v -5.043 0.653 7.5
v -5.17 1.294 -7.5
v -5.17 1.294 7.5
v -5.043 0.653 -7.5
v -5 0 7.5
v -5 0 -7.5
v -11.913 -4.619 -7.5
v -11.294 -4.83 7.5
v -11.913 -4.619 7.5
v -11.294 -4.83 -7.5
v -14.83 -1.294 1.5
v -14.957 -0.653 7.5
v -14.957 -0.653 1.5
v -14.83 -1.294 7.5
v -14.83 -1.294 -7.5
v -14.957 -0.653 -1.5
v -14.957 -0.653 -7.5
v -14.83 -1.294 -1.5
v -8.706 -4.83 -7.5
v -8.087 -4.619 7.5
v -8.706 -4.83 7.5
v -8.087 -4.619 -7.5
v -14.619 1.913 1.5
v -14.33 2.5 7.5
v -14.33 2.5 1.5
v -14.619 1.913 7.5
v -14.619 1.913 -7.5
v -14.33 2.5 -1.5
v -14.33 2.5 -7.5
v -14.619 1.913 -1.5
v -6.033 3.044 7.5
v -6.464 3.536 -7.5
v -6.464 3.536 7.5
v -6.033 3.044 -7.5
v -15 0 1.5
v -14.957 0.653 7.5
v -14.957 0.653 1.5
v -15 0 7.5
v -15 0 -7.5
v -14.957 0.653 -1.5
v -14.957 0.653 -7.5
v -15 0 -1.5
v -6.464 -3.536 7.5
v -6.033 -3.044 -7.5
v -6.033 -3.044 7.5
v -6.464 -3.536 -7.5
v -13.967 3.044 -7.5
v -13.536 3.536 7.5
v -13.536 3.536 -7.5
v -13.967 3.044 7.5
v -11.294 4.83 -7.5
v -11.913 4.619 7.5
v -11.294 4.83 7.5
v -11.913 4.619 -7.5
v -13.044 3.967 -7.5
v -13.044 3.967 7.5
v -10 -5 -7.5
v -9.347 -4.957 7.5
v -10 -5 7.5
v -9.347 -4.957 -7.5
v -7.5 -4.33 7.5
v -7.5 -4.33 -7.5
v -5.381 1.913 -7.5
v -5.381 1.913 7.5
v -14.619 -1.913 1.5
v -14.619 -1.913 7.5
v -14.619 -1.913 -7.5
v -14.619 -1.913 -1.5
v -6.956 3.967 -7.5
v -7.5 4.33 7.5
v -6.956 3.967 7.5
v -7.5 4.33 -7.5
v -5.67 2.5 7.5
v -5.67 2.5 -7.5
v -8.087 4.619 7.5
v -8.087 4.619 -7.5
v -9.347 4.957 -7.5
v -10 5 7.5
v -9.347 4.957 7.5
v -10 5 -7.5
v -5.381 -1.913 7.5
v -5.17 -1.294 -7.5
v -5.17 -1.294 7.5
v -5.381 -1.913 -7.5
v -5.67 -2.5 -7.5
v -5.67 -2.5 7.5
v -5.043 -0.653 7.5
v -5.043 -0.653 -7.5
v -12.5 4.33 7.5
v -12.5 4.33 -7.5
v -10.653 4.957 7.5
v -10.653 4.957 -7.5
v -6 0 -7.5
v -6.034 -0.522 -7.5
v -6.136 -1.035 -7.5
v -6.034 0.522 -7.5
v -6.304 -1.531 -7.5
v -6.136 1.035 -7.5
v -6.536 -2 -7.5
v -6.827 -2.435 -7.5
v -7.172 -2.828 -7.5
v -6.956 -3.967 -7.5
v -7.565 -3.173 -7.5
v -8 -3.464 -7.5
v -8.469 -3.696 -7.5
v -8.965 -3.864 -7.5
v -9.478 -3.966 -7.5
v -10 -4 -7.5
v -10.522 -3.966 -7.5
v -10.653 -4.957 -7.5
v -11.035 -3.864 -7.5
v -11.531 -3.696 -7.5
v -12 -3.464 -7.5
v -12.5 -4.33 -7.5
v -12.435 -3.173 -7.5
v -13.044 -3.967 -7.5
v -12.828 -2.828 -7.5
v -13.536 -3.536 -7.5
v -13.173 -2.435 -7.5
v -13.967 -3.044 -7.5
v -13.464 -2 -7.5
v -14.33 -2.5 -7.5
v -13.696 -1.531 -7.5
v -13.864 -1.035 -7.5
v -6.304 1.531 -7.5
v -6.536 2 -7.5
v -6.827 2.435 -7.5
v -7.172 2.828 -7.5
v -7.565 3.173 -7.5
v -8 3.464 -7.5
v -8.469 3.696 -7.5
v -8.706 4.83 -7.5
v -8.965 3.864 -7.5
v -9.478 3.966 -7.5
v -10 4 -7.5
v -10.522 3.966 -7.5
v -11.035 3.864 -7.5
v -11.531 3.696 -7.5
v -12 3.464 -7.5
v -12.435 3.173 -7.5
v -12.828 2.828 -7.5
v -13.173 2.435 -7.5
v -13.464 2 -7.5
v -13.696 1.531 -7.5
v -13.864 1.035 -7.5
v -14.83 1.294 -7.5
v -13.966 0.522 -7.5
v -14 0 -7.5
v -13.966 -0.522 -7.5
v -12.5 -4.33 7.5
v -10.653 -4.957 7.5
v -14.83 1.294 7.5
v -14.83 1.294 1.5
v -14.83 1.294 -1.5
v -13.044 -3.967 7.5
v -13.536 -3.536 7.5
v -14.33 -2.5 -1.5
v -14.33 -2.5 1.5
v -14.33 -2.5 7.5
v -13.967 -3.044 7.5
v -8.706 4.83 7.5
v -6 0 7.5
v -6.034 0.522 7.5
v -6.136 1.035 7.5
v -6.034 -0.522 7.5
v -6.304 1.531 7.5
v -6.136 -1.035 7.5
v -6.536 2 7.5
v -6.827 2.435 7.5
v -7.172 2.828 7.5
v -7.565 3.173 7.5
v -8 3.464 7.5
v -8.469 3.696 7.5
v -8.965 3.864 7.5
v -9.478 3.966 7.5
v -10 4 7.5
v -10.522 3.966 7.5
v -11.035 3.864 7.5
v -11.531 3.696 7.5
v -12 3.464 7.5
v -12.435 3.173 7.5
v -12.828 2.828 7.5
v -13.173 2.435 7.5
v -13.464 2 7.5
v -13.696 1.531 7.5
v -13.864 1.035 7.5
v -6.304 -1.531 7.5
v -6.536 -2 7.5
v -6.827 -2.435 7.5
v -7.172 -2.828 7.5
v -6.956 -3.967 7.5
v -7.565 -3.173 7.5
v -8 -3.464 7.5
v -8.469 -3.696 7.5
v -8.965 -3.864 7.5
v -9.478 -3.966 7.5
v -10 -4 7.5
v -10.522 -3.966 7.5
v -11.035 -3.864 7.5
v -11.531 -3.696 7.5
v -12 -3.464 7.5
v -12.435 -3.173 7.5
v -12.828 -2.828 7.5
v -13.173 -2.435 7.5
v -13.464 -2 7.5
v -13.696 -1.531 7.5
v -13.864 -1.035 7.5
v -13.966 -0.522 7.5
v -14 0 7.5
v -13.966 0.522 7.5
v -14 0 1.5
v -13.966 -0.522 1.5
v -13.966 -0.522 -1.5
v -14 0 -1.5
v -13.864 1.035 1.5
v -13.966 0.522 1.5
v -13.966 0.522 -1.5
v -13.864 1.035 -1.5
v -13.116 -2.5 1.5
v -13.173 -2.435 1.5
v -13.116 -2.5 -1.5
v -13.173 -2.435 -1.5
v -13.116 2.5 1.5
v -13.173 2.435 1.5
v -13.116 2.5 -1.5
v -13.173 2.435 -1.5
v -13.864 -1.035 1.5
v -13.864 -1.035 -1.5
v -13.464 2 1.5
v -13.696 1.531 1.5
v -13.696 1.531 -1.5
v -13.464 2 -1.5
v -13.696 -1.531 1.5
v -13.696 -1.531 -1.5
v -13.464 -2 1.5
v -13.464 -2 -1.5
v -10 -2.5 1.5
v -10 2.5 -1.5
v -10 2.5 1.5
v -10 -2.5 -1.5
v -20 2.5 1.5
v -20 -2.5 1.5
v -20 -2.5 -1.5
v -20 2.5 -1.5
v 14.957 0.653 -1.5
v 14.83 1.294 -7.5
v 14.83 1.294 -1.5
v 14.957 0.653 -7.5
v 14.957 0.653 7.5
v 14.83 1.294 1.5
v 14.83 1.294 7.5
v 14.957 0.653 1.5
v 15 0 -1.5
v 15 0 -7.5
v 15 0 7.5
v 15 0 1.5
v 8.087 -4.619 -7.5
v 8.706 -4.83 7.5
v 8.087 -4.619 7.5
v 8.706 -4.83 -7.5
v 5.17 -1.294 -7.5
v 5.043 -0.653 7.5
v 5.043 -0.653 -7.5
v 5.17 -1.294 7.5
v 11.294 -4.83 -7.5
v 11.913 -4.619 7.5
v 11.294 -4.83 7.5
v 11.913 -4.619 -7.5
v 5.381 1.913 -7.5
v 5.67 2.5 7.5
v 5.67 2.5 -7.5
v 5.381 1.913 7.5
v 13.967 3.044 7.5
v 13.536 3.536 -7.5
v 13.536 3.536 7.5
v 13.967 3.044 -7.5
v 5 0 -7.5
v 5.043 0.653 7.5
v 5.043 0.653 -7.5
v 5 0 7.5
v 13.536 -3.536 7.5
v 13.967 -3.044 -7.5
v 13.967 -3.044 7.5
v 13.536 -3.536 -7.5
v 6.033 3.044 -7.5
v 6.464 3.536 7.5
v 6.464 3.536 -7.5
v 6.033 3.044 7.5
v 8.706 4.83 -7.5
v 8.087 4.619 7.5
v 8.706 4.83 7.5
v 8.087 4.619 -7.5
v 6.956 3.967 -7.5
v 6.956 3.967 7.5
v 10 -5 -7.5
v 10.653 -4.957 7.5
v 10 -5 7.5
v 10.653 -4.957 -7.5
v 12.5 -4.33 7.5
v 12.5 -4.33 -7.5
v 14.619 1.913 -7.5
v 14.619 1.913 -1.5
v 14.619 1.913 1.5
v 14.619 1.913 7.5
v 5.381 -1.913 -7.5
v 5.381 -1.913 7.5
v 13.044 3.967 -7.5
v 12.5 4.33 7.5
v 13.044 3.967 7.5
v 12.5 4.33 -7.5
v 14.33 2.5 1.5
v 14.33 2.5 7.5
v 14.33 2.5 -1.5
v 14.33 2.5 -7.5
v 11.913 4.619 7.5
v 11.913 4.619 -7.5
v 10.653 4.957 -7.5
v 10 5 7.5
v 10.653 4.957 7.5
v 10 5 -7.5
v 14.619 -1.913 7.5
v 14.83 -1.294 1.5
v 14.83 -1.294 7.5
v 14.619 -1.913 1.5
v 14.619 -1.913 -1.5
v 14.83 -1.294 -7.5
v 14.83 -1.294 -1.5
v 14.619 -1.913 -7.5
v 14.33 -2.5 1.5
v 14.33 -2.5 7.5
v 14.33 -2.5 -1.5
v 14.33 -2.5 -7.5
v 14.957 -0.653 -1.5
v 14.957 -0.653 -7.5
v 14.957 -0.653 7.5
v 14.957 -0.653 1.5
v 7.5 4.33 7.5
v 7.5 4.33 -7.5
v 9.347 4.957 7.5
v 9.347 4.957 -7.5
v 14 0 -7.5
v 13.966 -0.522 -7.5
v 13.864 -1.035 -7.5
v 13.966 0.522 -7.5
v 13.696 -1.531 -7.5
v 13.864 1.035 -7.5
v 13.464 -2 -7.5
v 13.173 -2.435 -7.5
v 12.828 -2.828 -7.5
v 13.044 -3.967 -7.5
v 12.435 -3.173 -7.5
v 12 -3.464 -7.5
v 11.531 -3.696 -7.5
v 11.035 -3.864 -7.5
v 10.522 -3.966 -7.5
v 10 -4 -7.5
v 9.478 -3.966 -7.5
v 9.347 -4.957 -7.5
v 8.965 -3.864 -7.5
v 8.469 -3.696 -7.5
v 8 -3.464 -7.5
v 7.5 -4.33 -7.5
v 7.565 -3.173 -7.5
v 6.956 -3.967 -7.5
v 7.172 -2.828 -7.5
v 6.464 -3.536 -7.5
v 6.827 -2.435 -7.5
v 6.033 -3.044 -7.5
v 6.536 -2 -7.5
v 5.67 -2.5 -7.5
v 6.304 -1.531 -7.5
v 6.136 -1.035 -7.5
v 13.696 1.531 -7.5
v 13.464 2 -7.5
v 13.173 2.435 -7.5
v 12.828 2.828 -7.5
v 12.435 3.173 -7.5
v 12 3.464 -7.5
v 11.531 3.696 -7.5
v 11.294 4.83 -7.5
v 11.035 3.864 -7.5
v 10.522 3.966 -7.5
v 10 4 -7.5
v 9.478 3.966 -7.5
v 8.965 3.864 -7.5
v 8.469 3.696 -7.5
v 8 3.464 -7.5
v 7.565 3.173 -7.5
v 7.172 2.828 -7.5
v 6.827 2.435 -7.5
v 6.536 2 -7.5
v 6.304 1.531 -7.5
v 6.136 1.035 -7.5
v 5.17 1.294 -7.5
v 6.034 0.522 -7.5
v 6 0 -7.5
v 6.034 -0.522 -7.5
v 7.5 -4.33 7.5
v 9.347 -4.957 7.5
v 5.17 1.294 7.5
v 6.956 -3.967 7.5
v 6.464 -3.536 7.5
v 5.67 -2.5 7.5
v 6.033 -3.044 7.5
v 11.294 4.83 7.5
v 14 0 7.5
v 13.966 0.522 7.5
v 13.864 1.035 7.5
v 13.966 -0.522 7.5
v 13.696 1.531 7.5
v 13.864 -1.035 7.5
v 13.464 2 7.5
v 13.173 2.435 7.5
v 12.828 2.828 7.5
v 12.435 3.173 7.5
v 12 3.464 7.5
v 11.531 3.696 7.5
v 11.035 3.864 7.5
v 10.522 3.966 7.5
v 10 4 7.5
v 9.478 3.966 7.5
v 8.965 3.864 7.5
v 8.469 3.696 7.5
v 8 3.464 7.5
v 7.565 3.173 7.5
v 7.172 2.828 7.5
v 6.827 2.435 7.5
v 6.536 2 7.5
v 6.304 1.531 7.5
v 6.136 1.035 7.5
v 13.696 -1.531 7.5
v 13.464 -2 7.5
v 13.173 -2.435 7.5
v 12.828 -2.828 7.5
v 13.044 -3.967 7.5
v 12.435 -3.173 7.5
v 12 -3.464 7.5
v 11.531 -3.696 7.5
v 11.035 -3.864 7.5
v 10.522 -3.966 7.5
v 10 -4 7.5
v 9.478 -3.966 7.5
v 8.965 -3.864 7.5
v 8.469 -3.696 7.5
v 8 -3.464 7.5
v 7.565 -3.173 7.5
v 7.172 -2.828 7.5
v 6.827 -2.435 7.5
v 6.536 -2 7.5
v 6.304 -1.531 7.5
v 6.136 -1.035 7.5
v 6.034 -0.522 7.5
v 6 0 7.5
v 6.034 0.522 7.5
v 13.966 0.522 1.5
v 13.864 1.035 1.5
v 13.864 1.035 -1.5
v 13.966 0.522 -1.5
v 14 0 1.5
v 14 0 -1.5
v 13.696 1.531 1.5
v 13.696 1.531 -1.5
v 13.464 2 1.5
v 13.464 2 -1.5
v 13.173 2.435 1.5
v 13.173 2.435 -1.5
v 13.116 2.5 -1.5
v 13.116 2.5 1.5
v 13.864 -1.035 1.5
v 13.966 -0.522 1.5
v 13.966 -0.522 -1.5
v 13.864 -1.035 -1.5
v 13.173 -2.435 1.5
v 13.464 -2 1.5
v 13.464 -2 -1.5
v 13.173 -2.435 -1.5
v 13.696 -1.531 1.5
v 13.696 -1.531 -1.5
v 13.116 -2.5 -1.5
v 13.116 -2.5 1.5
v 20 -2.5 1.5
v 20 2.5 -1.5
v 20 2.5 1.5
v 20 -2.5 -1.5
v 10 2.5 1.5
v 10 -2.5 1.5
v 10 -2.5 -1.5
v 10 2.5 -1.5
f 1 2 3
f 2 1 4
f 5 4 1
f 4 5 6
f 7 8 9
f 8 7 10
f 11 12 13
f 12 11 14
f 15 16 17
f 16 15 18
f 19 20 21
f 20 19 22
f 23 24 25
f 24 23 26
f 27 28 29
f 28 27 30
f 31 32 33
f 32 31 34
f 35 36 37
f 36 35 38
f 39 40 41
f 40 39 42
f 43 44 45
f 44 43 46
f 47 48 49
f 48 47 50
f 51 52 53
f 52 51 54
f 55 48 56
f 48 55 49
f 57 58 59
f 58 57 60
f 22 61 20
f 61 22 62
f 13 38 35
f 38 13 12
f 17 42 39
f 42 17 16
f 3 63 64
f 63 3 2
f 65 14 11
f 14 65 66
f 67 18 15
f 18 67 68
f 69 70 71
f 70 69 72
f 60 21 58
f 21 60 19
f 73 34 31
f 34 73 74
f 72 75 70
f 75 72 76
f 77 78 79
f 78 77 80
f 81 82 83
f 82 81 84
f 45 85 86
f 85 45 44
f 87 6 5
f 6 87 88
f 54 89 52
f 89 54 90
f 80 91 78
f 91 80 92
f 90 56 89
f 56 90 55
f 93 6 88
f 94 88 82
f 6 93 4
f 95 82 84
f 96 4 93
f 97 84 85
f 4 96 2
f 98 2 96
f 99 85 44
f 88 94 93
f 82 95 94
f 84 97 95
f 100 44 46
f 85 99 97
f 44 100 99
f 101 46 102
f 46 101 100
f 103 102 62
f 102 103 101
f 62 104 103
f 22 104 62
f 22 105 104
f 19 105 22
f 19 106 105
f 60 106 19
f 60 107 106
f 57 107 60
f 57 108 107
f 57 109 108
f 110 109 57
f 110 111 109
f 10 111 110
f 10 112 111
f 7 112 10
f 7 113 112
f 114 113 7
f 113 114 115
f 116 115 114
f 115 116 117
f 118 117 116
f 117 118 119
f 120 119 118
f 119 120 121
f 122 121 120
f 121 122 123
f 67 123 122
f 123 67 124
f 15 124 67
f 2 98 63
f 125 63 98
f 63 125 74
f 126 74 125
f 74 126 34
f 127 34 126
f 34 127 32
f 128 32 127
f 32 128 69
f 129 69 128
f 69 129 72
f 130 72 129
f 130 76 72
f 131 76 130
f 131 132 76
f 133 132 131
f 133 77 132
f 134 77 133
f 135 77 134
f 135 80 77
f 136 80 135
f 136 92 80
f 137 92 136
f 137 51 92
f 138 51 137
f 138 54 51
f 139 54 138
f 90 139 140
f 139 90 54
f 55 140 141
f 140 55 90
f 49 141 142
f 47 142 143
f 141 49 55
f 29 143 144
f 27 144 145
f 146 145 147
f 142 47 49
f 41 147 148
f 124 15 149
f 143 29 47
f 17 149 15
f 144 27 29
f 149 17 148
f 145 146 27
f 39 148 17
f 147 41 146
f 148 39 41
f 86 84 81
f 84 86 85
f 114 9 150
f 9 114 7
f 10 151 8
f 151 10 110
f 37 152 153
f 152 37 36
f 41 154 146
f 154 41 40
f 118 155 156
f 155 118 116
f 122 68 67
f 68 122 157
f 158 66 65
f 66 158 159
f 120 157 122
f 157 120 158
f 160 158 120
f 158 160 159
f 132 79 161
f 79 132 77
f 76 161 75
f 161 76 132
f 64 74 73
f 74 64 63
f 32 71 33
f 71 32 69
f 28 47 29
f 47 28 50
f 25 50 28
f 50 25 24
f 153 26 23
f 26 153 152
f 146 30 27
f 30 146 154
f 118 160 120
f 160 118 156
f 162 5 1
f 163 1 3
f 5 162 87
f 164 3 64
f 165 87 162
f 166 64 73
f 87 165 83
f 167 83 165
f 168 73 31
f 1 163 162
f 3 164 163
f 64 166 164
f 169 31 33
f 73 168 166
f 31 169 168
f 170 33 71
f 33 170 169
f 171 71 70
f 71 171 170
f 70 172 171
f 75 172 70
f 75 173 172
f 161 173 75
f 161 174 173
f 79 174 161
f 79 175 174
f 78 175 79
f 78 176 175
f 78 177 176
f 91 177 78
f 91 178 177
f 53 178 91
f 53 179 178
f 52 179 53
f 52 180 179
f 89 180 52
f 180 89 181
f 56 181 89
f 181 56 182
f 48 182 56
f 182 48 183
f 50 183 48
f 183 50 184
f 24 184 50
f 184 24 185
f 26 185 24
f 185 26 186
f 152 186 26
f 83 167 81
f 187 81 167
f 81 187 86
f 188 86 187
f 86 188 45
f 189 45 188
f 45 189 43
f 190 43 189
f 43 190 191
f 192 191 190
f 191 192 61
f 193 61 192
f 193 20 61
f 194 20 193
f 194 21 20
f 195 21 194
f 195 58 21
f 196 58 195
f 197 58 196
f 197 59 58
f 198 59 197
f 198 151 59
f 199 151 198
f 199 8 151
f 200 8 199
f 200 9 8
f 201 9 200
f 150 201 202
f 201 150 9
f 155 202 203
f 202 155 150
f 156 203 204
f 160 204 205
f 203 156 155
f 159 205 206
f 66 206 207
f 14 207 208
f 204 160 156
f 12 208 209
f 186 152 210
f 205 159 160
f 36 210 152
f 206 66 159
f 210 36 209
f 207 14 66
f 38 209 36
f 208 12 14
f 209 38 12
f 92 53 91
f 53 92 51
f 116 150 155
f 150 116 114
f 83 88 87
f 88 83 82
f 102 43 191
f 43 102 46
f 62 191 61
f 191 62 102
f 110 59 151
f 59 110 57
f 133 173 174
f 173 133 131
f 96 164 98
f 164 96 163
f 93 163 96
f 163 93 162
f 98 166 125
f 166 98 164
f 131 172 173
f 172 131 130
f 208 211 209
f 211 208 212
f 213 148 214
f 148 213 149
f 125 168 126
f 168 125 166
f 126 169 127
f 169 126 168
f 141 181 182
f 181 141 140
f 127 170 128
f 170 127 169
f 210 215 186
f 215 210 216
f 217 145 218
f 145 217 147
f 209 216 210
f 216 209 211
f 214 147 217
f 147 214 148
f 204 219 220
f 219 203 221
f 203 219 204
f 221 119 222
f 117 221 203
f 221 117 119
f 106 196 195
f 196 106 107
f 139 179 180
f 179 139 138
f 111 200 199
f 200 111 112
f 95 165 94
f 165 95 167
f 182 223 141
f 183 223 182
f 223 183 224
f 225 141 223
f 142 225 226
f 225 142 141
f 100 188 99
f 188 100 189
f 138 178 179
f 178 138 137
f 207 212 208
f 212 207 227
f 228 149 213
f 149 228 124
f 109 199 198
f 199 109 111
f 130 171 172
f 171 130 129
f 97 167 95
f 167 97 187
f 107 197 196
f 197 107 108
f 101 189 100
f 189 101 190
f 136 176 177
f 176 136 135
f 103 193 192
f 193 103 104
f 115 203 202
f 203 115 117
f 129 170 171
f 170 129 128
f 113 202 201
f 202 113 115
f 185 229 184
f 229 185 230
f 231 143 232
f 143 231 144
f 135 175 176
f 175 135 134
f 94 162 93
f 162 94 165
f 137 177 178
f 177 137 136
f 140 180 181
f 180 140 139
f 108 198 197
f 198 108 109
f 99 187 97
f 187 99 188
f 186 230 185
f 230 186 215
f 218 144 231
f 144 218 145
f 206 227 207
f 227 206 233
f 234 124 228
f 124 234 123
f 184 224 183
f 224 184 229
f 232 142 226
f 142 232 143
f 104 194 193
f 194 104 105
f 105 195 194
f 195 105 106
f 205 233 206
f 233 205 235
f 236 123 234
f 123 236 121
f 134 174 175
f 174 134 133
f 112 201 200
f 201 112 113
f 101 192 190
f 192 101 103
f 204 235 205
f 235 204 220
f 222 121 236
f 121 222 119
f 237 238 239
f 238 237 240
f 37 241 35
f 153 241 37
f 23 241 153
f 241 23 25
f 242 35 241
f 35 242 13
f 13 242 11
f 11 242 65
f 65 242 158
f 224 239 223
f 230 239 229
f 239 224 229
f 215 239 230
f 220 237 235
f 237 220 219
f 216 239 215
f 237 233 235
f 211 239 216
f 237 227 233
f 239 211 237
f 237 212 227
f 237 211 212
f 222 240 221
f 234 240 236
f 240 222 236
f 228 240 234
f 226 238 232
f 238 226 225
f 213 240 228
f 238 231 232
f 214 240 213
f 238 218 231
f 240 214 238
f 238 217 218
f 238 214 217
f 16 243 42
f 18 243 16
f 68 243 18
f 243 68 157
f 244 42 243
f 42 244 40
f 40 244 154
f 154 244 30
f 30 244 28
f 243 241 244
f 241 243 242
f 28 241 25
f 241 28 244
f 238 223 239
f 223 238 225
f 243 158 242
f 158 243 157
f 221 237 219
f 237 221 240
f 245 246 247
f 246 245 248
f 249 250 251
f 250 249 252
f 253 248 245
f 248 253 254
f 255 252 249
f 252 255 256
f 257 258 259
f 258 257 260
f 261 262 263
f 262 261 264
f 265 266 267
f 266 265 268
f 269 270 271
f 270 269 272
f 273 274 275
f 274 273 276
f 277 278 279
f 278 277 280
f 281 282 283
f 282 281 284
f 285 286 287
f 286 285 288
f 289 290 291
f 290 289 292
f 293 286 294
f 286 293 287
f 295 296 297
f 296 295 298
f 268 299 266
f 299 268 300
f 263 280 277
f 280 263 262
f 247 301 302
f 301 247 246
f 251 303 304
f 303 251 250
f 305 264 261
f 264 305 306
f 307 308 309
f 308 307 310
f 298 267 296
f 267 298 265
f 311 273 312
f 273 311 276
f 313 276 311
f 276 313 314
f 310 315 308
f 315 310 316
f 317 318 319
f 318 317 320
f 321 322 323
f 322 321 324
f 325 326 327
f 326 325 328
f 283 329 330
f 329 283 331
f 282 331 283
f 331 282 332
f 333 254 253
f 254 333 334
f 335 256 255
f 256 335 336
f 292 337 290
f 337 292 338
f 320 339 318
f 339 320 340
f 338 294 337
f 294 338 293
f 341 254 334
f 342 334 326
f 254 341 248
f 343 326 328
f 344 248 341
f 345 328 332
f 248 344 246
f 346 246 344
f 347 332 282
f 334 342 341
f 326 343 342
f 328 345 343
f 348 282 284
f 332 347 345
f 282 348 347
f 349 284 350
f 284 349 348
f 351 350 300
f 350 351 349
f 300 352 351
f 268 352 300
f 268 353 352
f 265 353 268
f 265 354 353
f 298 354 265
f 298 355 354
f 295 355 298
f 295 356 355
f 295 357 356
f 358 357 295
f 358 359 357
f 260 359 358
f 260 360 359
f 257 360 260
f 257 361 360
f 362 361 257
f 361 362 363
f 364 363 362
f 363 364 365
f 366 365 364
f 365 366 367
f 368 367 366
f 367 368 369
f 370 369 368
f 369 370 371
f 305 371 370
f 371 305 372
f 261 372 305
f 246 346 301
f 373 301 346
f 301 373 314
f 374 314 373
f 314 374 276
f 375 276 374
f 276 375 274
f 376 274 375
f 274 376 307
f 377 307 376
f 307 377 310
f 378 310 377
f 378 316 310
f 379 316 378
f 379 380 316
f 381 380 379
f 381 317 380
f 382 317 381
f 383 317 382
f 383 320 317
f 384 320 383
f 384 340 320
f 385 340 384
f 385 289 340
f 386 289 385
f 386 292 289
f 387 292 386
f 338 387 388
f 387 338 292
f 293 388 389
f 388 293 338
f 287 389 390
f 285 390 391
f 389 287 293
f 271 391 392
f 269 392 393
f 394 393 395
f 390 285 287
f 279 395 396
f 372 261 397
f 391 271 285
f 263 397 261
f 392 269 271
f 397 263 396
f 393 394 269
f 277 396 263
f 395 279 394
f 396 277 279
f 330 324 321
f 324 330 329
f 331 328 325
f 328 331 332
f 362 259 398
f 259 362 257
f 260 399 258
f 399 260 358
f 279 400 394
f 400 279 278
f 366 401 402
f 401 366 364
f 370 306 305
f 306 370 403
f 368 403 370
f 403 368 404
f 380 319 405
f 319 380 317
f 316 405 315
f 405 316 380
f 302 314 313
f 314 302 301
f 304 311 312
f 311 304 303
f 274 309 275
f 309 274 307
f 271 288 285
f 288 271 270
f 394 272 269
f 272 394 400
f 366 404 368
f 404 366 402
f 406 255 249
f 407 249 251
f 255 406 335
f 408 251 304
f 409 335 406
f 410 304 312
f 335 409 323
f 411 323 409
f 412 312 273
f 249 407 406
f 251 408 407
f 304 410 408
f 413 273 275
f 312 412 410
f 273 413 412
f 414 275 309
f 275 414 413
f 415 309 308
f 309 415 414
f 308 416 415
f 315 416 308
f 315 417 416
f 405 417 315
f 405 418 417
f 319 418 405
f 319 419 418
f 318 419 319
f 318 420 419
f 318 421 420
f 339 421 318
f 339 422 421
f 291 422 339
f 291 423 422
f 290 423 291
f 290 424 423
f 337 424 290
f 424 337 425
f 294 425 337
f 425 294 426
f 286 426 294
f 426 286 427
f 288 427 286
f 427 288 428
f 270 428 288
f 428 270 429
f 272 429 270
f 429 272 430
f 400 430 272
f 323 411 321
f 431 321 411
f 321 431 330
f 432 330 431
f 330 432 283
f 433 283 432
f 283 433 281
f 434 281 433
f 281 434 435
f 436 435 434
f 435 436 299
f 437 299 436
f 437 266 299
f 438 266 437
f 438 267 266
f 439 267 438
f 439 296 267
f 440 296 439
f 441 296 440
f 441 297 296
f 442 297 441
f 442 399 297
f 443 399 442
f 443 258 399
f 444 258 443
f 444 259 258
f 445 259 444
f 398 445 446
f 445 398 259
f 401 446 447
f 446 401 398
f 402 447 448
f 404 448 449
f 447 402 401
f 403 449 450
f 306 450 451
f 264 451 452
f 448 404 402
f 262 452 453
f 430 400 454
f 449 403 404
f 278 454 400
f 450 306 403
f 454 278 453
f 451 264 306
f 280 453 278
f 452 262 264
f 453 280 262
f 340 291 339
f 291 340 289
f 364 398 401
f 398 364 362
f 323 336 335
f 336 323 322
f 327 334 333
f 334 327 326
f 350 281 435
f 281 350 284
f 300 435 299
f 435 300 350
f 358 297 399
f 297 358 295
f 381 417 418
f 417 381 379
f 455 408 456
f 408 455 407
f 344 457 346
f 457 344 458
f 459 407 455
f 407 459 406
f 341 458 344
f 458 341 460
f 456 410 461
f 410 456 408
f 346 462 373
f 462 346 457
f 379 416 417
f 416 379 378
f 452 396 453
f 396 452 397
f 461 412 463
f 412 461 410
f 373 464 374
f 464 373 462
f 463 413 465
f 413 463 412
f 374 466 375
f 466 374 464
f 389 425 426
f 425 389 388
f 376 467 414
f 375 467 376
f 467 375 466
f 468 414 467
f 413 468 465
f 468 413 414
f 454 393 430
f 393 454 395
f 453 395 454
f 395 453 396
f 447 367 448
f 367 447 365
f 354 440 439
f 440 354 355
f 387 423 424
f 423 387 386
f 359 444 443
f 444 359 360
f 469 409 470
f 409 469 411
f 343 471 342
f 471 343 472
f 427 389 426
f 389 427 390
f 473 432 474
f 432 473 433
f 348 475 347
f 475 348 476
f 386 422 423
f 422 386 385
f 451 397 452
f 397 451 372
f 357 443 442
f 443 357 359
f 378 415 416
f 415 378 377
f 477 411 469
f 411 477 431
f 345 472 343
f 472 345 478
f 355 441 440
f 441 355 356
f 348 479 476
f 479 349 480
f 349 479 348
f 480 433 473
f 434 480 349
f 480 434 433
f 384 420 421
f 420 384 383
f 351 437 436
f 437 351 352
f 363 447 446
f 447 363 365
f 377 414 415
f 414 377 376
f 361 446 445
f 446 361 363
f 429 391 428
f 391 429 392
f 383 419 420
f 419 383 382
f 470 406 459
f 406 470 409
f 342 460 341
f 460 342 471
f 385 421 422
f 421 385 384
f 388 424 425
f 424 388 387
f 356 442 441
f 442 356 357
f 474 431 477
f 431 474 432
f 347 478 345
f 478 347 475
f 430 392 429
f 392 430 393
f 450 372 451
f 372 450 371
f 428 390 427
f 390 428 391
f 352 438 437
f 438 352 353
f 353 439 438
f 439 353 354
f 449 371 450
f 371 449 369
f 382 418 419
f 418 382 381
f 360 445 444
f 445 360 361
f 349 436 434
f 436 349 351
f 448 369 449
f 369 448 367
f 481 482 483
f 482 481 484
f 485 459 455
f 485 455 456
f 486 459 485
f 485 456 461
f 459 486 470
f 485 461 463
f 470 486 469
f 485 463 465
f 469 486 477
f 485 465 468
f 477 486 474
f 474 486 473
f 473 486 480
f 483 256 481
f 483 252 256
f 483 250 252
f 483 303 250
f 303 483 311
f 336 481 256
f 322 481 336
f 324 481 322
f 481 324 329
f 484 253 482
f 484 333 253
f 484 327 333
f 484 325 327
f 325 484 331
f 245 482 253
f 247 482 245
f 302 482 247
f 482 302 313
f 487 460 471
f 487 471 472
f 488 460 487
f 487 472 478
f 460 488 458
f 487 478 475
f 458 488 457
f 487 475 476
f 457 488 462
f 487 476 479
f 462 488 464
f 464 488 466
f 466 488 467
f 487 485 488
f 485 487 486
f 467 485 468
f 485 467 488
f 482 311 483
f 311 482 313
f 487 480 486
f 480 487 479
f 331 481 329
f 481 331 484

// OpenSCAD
// Generated by SolidPython 0.4.0 on 2019-09-03 12:41:30
$fn = 48;

union() {
	union() {
		translate(v = [-15, 0, 0]) {
			cube(center = true, size = [10, 5, 3]);
		}
		translate(v = [-10, 0, 0]) {
			difference() {
				cylinder(center = true, h = 15, r = 5);
				cylinder(center = true, h = 16, r = 4);
			}
		}
	}
	union() {
		translate(v = [15, 0, 0]) {
			cube(center = true, size = [10, 5, 3]);
		}
		translate(v = [10, 0, 0]) {
			difference() {
				cylinder(center = true, h = 15, r = 5);
				cylinder(center = true, h = 16, r = 4);
			}
		}
	}
}
/***********************************************
*********      SolidPython code:      **********
************************************************
 
#! /usr/bin/env python
# -*- coding: utf-8 -*-
from __future__ import division
import os
import sys

from solid import *
from solid.utils import *

SEGMENTS = 48


def basic_geometry():
    # SolidPython code can look a lot like OpenSCAD code.  It also has
    # some syntactic sugar built in that can make it look more pythonic.
    # Here are two identical pieces of geometry, one left and one right.

    # left_piece uses standard OpenSCAD grammar (note the commas between
    # block elements; OpenSCAD doesn't require this)
    left_piece =  union()(
                        translate([-15, 0, 0])(
                            cube([10, 5, 3], center=True)
                        ),
                        translate([-10, 0, 0])(
                            difference()(
                                cylinder(r=5, h=15, center=True),
                                cylinder(r=4, h=16, center=True)
                            )
                        )
                    )
    
    # Right piece uses a more Pythonic grammar.  + (plus) is equivalent to union(), 
    # - (minus) is equivalent to difference() and * (star) is equivalent to intersection
    # solid.utils also defines up(), down(), left(), right(), forward(), and back()
    # for common transforms.
    right_piece = right(15)(cube([10, 5, 3], center=True))
    cyl = cylinder(r=5, h=15, center=True) - cylinder(r=4, h=16, center=True)
    right_piece += right(10)(cyl)

    return union()(left_piece, right_piece)

if __name__ == '__main__':
    out_dir = sys.argv[1] if len(sys.argv) > 1 else os.curdir
    file_out = os.path.join(out_dir, 'basic_geometry.scad')

    a = basic_geometry()

    print("%(__file__)s: SCAD file written to: \n%(file_out)s" % vars())

    # Adding the file_header argument as shown allows you to change
    # the detail of arcs by changing the SEGMENTS variable.  This can
    # be expensive when making lots of small curves, but is otherwise
    # useful.
    scad_render_to_file(a, file_out, file_header='$fn = %s;' % SEGMENTS)
 
 
************************************************/
